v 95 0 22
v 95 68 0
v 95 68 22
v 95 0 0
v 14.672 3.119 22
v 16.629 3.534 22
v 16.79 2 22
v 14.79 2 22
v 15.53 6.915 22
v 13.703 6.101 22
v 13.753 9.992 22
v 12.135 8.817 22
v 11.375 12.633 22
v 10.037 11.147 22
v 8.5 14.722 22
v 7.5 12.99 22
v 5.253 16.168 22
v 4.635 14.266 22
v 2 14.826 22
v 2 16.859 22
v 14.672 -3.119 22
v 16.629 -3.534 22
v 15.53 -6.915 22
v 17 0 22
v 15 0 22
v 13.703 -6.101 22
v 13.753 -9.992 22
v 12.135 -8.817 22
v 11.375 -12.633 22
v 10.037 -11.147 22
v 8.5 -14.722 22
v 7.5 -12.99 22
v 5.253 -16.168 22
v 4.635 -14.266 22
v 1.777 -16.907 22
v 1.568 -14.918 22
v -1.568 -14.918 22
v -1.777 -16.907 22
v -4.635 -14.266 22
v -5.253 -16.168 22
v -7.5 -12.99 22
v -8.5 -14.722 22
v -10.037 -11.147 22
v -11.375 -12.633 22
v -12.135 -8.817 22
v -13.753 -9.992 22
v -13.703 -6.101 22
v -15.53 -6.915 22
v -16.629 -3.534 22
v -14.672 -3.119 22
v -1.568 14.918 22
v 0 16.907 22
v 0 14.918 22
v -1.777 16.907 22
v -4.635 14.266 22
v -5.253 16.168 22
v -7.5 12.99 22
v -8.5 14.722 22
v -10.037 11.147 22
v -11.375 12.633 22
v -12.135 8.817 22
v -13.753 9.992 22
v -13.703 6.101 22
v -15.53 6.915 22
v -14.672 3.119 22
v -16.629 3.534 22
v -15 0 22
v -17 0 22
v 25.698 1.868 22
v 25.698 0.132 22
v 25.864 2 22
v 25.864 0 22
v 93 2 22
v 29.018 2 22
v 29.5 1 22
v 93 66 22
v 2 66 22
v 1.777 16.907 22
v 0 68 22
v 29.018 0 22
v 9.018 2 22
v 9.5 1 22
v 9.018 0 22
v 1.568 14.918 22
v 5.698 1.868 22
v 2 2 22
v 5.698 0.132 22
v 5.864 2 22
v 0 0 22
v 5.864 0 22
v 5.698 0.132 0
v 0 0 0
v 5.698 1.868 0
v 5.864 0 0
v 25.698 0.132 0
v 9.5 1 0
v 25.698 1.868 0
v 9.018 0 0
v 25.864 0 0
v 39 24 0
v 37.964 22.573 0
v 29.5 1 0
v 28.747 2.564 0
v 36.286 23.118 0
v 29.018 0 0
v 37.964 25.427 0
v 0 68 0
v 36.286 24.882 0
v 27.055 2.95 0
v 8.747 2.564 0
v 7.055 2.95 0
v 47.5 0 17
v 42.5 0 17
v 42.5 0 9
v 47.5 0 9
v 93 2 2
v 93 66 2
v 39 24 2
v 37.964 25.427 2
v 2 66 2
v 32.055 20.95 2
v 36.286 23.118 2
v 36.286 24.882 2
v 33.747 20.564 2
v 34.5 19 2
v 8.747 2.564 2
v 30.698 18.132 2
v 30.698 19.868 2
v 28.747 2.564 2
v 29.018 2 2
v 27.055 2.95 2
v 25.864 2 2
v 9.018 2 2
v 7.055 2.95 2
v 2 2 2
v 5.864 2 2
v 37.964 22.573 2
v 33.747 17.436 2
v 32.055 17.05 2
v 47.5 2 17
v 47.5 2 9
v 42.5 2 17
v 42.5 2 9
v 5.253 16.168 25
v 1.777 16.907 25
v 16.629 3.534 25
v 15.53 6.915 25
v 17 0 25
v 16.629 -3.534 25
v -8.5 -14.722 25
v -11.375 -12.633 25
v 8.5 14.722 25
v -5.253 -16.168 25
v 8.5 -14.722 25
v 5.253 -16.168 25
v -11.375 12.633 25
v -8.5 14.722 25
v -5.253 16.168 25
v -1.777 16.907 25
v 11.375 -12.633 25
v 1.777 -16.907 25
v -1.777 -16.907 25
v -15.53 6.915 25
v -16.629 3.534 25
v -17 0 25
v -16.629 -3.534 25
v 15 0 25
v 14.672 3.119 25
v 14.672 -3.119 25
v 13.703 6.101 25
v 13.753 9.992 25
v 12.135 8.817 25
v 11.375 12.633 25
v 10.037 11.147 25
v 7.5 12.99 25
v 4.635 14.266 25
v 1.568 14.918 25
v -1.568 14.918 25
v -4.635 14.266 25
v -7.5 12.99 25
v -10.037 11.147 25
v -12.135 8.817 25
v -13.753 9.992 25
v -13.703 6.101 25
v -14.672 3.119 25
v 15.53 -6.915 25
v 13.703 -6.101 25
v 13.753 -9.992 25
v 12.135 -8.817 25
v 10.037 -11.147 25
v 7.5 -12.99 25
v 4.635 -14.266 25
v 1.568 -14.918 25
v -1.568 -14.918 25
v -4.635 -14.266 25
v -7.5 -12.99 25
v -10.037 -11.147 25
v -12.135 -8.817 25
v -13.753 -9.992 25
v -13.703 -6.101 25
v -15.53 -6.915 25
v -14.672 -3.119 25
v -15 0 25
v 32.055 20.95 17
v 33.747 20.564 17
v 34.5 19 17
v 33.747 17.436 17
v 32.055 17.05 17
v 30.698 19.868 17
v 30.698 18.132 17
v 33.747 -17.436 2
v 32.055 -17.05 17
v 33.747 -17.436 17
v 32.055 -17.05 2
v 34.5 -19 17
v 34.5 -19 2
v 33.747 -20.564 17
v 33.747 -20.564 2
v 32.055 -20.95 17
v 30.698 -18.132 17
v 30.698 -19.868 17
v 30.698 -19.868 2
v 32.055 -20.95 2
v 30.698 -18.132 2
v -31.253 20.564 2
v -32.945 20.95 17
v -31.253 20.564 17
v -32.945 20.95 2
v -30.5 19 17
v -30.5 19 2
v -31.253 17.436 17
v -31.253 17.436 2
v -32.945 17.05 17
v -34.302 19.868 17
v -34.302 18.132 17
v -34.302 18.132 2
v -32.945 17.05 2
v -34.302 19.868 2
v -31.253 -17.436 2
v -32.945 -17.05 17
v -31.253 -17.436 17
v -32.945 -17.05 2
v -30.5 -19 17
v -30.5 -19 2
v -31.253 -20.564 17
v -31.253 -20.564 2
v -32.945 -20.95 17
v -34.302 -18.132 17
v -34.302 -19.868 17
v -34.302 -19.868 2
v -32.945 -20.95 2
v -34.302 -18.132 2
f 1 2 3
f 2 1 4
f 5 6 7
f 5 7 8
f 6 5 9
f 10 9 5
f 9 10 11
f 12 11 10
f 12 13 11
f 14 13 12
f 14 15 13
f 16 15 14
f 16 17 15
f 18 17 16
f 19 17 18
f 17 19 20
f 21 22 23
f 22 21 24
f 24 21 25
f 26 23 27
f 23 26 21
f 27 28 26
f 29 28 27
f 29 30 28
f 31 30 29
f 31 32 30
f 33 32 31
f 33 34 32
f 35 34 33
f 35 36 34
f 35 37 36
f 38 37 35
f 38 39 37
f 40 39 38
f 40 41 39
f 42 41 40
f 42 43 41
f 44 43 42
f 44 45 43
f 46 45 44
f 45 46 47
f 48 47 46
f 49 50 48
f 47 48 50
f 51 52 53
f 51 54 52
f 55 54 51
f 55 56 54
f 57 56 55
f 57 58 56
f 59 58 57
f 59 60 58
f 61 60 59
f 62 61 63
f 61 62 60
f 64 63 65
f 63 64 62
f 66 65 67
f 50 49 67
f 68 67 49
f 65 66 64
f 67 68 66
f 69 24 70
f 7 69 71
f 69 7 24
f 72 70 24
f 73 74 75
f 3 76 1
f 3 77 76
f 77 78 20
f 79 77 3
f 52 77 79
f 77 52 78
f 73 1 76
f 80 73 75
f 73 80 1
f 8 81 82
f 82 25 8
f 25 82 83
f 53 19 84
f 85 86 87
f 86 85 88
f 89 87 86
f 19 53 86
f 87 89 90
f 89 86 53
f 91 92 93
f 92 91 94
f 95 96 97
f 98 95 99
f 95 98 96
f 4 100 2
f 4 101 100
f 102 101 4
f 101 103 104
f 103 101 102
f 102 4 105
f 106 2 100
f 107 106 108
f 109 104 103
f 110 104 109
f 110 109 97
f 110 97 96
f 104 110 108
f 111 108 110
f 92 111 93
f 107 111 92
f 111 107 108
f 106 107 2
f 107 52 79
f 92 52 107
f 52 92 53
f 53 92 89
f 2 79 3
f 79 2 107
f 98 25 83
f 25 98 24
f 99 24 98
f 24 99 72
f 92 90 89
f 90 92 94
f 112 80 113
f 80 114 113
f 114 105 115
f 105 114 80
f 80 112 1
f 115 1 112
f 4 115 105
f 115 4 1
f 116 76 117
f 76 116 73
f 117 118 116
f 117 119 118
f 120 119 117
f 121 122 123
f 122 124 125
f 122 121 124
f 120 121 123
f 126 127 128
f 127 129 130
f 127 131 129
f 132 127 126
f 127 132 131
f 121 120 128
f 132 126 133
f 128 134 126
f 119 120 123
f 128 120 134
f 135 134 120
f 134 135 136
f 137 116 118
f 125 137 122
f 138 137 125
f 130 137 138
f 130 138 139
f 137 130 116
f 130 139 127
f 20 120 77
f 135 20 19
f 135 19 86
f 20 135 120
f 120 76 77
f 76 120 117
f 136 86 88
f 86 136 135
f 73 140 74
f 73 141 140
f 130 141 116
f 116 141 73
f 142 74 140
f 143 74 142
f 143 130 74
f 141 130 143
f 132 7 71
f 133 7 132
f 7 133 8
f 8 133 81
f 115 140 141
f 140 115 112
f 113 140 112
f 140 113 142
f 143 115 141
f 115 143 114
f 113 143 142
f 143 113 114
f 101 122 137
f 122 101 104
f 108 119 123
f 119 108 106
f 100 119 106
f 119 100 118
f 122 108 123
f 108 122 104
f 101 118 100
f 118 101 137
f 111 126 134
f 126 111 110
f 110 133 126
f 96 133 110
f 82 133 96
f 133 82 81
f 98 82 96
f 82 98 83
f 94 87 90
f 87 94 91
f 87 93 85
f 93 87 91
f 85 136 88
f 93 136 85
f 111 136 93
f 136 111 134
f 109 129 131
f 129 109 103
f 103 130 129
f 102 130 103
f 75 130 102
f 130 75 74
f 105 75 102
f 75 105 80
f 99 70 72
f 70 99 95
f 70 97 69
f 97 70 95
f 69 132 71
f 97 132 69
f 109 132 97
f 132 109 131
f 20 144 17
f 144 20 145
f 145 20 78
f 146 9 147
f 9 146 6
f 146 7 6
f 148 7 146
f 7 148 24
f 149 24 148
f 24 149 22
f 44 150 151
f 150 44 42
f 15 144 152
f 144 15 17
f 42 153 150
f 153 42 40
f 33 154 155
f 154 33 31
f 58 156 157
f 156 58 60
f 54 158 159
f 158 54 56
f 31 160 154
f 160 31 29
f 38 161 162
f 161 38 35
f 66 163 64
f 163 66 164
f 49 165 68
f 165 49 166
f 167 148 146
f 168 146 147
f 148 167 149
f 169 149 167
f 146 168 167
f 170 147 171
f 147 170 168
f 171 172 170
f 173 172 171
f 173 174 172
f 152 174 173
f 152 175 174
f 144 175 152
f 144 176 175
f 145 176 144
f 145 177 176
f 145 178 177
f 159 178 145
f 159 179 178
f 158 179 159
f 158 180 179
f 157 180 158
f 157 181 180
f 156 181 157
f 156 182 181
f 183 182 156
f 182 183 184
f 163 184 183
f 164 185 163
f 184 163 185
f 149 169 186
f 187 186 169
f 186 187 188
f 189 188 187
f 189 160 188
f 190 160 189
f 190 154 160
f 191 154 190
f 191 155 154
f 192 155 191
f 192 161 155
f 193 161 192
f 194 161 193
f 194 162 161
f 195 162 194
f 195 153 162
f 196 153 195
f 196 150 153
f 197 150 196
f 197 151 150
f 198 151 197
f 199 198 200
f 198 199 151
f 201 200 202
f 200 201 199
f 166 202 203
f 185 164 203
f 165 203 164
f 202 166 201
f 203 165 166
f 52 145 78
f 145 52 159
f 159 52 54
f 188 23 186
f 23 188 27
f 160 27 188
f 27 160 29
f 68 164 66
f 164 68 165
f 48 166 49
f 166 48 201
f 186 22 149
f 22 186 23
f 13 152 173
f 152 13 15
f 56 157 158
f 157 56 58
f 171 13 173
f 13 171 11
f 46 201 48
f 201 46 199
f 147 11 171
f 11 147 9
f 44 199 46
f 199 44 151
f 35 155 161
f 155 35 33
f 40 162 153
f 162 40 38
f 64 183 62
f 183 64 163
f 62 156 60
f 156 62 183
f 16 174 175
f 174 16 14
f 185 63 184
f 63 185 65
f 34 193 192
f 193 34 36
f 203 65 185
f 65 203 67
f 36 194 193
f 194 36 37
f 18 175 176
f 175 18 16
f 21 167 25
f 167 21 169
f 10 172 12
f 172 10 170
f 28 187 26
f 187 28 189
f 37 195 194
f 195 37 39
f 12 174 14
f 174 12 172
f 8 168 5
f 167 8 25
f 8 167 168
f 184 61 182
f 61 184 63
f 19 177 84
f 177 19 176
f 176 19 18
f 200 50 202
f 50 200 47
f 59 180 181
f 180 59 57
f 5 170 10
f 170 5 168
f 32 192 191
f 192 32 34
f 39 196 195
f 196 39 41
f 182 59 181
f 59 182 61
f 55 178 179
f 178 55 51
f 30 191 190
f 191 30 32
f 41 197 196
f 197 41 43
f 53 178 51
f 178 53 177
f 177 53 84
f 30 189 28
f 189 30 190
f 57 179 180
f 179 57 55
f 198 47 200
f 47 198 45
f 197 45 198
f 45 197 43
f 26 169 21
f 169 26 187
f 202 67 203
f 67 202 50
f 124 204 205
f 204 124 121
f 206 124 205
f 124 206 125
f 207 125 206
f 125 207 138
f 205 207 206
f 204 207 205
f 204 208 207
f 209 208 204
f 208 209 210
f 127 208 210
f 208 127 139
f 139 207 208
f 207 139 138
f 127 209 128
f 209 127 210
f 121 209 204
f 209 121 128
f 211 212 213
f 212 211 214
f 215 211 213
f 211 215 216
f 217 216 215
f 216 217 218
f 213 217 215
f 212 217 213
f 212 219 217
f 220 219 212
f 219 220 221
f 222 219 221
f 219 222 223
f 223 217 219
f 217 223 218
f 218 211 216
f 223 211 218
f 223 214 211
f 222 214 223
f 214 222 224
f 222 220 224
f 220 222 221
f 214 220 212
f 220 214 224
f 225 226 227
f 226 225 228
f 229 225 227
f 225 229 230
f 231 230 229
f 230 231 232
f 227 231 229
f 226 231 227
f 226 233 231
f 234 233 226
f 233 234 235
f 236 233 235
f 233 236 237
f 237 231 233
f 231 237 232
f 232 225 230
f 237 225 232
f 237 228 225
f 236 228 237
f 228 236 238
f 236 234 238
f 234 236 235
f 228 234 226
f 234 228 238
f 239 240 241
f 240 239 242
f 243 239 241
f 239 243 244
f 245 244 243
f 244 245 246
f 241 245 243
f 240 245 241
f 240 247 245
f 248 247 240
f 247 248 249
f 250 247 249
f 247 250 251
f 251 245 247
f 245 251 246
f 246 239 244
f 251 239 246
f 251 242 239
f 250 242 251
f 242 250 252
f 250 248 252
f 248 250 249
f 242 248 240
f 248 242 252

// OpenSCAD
// Case para Raspberry Pi - Estação QC
// Arquivo OpenSCAD Paramétrico
// Data: 2025-11-10
// Projeto: 3dPot - Estação de Controle de Qualidade

// ==================== PARÂMETROS ====================
// Todas as medidas em mm

// Dimensões do Raspberry Pi 4
rpi_length = 85.0;          // Comprimento do RPi 4
rpi_width = 56.0;           // Largura do RPi 4
rpi_height = 17.0;          // Altura do RPi 4 (com conectores)
board_thickness = 1.2;      // Espessura da placa

// Dimensões do case
case_length = 95.0;         // Comprimento interno do case
case_width = 68.0;          // Largura interna do case
case_height = 22.0;         // Altura interna do case
wall_thickness = 2.0;       // Espessura das paredes

// Ventilação e散热
fan_diameter = 30.0;        // Diâmetro do ventilador
fan_hole_diameter = 3.0;    // Diâmetro dos furos de montagem do ventilador
vent_hole_diameter = 4.0;   // Diâmetro dos furos de ventilação
vent_spacing = 8.0;         // Espaçamento entre furos

// Portas e aberturas
usb_cutout_width = 15.0;    // Largura do recorte para USB
hdmi_cutout_width = 13.0;   // Largura do recorte para HDMI
ethernet_cutout_width = 13.0; // Largura do recorte para Ethernet
power_cutout_width = 8.0;   // Largura do recorte para energia

// Montagem
mounting_hole_diameter = 3.0;   // Diâmetro dos furos de montagem
mounting_hole_positions = [
    [case_length/2 - 10, case_width/2 - 10],
    [case_length/2 - 10, -case_width/2 + 10],
    [-case_length/2 + 10, case_width/2 - 10],
    [-case_length/2 + 10, -case_width/2 + 10]
];

// ==================== MODELAGEM ====================

module case_base() {
    // Base do case
    difference() {
        // Corpo principal
        cube([case_length, case_width, case_height]);
        
        // Cavidade interna para o RPi
        translate([wall_thickness, wall_thickness, wall_thickness]) {
            cube([case_length - 2*wall_thickness, 
                  case_width - 2*wall_thickness, 
                  case_height - wall_thickness]);
        }
    }
}

module ventilation_holes() {
    // Furos de ventilação nas paredes
    hole_positions = [
        // Laterais
        for (x = [-case_length/2 + 15:20:case_length/2 - 15])
        for (y = [-case_width/2 + 15:20:case_width/2 - 15])
        if (abs(x) < case_length/2 - 10 && abs(y) < case_width/2 - 10)
            [x, y, case_height/2],
        
        // Topo
        for (x = [-case_length/2 + 10:15:case_length/2 - 10])
        for (y = [-case_width/2 + 10:15:case_width/2 - 10])
        [x, y, case_height]
    ];
    
    for (pos = hole_positions) {
        if (pos[2] == case_height/2) {
            // Furos laterais
            translate([pos[0], pos[1], 0]) {
                cylinder(h = case_height, d = vent_hole_diameter);
            }
        } else {
            // Furos no topo
            translate([pos[0], pos[1], case_height - 1]) {
                cylinder(h = 2, d = vent_hole_diameter);
            }
        }
    }
}

module fan_mount() {
    // Suporte para ventilador no topo
    difference() {
        // Base do ventilador
        cylinder(d = fan_diameter + 4, h = 3);
        
        // Furo central para o ventilador
        cylinder(d = fan_diameter, h = 5);
        
        // Furos de montagem do ventilador
        for (angle = [0, 90, 180, 270]) {
            translate([
                cos(angle) * (fan_diameter/2 - 3),
                sin(angle) * (fan_diameter/2 - 3),
                0
            ]) {
                cylinder(d = fan_hole_diameter, h = 5);
            }
        }
    }
}

module port_cutouts() {
    // Recortes para portas
    // USB ports
    translate([case_length/2 - 5, 10, case_height/2 - 2]) {
        cube([5, usb_cutout_width, 8]);
    }
    
    translate([case_length/2 - 5, -10, case_height/2 - 2]) {
        cube([5, usb_cutout_width, 8]);
    }
    
    // HDMI ports
    translate([case_length/2 - 5, 20, case_height/2 - 2]) {
        cube([5, hdmi_cutout_width, 8]);
    }
    
    translate([case_length/2 - 5, -20, case_height/2 - 2]) {
        cube([5, hdmi_cutout_width, 8]);
    }
    
    // Ethernet port
    translate([-case_length/2, 0, case_height/2 - 2]) {
        cube([5, ethernet_cutout_width, 8]);
    }
    
    // Power port
    translate([-case_length/2, -15, case_height/2 - 2]) {
        cube([5, power_cutout_width, 8]);
    }
}

module mounting_holes() {
    // Furos de montagem nas esquinas
    for (pos = mounting_hole_positions) {
        translate([pos[0], pos[1], -1]) {
            cylinder(d = mounting_hole_diameter, h = case_height + 2);
        }
    }
}

module riser_pillars() {
    // Pilares de apoio para elevar o RPi
    pillar_positions = [
        [case_length/2 - 15, case_width/2 - 15],
        [case_length/2 - 15, -case_width/2 + 15],
        [-case_length/2 + 15, case_width/2 - 15],
        [-case_length/2 + 15, -case_width/2 + 15]
    ];
    
    for (pos = pillar_positions) {
        translate([pos[0], pos[1], wall_thickness]) {
            cylinder(d = 4, h = case_height - wall_thickness - 5);
        }
    }
}

module complete_case() {
    // Montagem completa do case
    difference() {
        case_base();
        port_cutouts();
        mounting_holes();
        ventilation_holes();
    }
    
    // Ventilador no topo
    translate([0, 0, case_height]) {
        fan_mount();
    }
    
    // Pilares de apoio
    riser_pillars();
}

// ==================== MONTAGEM FINAL ====================

complete_case();

// ==================== INSTRUÇÕES DE IMPRESSÃO ====================

/*
INSTRUÇÕES DE IMPRESSÃO 3D:

1. PARÂMETROS RECOMENDADOS:
   - Material: PLA+ (maior resistência térmica) ou PETG
   - Temperatura: PLA+ (220-235°C) / PETG (230-250°C)
   - Altura da camada: 0.2mm
   - Velocidade: 45-55mm/s
   - Suporte: DESNECESSÁRIO
   - Brim: 8mm para melhor aderência

2. ORIENTAÇÃO DE IMPRESSÃO:
   - Case base: Base para baixo
   - Ventilador: Disco para cima
   - Partes separadas para complexidade

3. MONTAGEM:
   1. Instalar ventilador na tampa
   2. Conectar fio do ventilador ao GPIO
   3. Inserir Raspberry Pi nos pilares
   4. Fechar case e fixar com parafusos
   5. Conectar cabos externos

4. COMPONENTES ADICIONAIS NECESSÁRIOS:
   - 1x Raspberry Pi 4 Model B
   - 1x Ventilador 30mm 5V
   - 1x Cartão microSD 32GB+
   - 4x Parafusos M3 x 8mm
   - 4x Porcas M3
   - 1x Fonte 5V 3A USB-C
   - 2x Cabos HDMI
   - 1x Cabo Ethernet
   - 1x Cabo USB para câmera

5. FUNCIONALIDADES:
   - Proteção física do RPi
   - Ventilação ativa com sensor de temperatura
   - Acesso fácil a todas as portas
   - Montagem em rack ou mesa
   - Facilita manutenção
   - Gestão de cabos organizada

6. ESPECIFICAÇÕES TÉCNICAS:
   - Dimensões: 95x68x22mm (interno)
   - Material: PLA+ com aditivos
   - Resistência: IP40 (poeira)
   - Ventilação: 30mm fan, 12V/5V
   - Capacidade térmica: Até 85°C ambiente
   - Vibração: <0.1G RMS

7. APLICAÇÕES:
   - Estação de controle de qualidade
   - Servidor de desenvolvimento
   - Edge computing
   - IoT gateway
   - Raspberry Pi para Indústria 4.0
   - Sistema de visão computacional

8. INTEGRAÇÃO COM PROJETO:
   - Câmera USB para inspeção
   - GPIO para sensores
   - Ethernet para comunicação
   - USB para dispositivos externos
   - HDMI para monitoramento
   - Software de QC integrado
*/
